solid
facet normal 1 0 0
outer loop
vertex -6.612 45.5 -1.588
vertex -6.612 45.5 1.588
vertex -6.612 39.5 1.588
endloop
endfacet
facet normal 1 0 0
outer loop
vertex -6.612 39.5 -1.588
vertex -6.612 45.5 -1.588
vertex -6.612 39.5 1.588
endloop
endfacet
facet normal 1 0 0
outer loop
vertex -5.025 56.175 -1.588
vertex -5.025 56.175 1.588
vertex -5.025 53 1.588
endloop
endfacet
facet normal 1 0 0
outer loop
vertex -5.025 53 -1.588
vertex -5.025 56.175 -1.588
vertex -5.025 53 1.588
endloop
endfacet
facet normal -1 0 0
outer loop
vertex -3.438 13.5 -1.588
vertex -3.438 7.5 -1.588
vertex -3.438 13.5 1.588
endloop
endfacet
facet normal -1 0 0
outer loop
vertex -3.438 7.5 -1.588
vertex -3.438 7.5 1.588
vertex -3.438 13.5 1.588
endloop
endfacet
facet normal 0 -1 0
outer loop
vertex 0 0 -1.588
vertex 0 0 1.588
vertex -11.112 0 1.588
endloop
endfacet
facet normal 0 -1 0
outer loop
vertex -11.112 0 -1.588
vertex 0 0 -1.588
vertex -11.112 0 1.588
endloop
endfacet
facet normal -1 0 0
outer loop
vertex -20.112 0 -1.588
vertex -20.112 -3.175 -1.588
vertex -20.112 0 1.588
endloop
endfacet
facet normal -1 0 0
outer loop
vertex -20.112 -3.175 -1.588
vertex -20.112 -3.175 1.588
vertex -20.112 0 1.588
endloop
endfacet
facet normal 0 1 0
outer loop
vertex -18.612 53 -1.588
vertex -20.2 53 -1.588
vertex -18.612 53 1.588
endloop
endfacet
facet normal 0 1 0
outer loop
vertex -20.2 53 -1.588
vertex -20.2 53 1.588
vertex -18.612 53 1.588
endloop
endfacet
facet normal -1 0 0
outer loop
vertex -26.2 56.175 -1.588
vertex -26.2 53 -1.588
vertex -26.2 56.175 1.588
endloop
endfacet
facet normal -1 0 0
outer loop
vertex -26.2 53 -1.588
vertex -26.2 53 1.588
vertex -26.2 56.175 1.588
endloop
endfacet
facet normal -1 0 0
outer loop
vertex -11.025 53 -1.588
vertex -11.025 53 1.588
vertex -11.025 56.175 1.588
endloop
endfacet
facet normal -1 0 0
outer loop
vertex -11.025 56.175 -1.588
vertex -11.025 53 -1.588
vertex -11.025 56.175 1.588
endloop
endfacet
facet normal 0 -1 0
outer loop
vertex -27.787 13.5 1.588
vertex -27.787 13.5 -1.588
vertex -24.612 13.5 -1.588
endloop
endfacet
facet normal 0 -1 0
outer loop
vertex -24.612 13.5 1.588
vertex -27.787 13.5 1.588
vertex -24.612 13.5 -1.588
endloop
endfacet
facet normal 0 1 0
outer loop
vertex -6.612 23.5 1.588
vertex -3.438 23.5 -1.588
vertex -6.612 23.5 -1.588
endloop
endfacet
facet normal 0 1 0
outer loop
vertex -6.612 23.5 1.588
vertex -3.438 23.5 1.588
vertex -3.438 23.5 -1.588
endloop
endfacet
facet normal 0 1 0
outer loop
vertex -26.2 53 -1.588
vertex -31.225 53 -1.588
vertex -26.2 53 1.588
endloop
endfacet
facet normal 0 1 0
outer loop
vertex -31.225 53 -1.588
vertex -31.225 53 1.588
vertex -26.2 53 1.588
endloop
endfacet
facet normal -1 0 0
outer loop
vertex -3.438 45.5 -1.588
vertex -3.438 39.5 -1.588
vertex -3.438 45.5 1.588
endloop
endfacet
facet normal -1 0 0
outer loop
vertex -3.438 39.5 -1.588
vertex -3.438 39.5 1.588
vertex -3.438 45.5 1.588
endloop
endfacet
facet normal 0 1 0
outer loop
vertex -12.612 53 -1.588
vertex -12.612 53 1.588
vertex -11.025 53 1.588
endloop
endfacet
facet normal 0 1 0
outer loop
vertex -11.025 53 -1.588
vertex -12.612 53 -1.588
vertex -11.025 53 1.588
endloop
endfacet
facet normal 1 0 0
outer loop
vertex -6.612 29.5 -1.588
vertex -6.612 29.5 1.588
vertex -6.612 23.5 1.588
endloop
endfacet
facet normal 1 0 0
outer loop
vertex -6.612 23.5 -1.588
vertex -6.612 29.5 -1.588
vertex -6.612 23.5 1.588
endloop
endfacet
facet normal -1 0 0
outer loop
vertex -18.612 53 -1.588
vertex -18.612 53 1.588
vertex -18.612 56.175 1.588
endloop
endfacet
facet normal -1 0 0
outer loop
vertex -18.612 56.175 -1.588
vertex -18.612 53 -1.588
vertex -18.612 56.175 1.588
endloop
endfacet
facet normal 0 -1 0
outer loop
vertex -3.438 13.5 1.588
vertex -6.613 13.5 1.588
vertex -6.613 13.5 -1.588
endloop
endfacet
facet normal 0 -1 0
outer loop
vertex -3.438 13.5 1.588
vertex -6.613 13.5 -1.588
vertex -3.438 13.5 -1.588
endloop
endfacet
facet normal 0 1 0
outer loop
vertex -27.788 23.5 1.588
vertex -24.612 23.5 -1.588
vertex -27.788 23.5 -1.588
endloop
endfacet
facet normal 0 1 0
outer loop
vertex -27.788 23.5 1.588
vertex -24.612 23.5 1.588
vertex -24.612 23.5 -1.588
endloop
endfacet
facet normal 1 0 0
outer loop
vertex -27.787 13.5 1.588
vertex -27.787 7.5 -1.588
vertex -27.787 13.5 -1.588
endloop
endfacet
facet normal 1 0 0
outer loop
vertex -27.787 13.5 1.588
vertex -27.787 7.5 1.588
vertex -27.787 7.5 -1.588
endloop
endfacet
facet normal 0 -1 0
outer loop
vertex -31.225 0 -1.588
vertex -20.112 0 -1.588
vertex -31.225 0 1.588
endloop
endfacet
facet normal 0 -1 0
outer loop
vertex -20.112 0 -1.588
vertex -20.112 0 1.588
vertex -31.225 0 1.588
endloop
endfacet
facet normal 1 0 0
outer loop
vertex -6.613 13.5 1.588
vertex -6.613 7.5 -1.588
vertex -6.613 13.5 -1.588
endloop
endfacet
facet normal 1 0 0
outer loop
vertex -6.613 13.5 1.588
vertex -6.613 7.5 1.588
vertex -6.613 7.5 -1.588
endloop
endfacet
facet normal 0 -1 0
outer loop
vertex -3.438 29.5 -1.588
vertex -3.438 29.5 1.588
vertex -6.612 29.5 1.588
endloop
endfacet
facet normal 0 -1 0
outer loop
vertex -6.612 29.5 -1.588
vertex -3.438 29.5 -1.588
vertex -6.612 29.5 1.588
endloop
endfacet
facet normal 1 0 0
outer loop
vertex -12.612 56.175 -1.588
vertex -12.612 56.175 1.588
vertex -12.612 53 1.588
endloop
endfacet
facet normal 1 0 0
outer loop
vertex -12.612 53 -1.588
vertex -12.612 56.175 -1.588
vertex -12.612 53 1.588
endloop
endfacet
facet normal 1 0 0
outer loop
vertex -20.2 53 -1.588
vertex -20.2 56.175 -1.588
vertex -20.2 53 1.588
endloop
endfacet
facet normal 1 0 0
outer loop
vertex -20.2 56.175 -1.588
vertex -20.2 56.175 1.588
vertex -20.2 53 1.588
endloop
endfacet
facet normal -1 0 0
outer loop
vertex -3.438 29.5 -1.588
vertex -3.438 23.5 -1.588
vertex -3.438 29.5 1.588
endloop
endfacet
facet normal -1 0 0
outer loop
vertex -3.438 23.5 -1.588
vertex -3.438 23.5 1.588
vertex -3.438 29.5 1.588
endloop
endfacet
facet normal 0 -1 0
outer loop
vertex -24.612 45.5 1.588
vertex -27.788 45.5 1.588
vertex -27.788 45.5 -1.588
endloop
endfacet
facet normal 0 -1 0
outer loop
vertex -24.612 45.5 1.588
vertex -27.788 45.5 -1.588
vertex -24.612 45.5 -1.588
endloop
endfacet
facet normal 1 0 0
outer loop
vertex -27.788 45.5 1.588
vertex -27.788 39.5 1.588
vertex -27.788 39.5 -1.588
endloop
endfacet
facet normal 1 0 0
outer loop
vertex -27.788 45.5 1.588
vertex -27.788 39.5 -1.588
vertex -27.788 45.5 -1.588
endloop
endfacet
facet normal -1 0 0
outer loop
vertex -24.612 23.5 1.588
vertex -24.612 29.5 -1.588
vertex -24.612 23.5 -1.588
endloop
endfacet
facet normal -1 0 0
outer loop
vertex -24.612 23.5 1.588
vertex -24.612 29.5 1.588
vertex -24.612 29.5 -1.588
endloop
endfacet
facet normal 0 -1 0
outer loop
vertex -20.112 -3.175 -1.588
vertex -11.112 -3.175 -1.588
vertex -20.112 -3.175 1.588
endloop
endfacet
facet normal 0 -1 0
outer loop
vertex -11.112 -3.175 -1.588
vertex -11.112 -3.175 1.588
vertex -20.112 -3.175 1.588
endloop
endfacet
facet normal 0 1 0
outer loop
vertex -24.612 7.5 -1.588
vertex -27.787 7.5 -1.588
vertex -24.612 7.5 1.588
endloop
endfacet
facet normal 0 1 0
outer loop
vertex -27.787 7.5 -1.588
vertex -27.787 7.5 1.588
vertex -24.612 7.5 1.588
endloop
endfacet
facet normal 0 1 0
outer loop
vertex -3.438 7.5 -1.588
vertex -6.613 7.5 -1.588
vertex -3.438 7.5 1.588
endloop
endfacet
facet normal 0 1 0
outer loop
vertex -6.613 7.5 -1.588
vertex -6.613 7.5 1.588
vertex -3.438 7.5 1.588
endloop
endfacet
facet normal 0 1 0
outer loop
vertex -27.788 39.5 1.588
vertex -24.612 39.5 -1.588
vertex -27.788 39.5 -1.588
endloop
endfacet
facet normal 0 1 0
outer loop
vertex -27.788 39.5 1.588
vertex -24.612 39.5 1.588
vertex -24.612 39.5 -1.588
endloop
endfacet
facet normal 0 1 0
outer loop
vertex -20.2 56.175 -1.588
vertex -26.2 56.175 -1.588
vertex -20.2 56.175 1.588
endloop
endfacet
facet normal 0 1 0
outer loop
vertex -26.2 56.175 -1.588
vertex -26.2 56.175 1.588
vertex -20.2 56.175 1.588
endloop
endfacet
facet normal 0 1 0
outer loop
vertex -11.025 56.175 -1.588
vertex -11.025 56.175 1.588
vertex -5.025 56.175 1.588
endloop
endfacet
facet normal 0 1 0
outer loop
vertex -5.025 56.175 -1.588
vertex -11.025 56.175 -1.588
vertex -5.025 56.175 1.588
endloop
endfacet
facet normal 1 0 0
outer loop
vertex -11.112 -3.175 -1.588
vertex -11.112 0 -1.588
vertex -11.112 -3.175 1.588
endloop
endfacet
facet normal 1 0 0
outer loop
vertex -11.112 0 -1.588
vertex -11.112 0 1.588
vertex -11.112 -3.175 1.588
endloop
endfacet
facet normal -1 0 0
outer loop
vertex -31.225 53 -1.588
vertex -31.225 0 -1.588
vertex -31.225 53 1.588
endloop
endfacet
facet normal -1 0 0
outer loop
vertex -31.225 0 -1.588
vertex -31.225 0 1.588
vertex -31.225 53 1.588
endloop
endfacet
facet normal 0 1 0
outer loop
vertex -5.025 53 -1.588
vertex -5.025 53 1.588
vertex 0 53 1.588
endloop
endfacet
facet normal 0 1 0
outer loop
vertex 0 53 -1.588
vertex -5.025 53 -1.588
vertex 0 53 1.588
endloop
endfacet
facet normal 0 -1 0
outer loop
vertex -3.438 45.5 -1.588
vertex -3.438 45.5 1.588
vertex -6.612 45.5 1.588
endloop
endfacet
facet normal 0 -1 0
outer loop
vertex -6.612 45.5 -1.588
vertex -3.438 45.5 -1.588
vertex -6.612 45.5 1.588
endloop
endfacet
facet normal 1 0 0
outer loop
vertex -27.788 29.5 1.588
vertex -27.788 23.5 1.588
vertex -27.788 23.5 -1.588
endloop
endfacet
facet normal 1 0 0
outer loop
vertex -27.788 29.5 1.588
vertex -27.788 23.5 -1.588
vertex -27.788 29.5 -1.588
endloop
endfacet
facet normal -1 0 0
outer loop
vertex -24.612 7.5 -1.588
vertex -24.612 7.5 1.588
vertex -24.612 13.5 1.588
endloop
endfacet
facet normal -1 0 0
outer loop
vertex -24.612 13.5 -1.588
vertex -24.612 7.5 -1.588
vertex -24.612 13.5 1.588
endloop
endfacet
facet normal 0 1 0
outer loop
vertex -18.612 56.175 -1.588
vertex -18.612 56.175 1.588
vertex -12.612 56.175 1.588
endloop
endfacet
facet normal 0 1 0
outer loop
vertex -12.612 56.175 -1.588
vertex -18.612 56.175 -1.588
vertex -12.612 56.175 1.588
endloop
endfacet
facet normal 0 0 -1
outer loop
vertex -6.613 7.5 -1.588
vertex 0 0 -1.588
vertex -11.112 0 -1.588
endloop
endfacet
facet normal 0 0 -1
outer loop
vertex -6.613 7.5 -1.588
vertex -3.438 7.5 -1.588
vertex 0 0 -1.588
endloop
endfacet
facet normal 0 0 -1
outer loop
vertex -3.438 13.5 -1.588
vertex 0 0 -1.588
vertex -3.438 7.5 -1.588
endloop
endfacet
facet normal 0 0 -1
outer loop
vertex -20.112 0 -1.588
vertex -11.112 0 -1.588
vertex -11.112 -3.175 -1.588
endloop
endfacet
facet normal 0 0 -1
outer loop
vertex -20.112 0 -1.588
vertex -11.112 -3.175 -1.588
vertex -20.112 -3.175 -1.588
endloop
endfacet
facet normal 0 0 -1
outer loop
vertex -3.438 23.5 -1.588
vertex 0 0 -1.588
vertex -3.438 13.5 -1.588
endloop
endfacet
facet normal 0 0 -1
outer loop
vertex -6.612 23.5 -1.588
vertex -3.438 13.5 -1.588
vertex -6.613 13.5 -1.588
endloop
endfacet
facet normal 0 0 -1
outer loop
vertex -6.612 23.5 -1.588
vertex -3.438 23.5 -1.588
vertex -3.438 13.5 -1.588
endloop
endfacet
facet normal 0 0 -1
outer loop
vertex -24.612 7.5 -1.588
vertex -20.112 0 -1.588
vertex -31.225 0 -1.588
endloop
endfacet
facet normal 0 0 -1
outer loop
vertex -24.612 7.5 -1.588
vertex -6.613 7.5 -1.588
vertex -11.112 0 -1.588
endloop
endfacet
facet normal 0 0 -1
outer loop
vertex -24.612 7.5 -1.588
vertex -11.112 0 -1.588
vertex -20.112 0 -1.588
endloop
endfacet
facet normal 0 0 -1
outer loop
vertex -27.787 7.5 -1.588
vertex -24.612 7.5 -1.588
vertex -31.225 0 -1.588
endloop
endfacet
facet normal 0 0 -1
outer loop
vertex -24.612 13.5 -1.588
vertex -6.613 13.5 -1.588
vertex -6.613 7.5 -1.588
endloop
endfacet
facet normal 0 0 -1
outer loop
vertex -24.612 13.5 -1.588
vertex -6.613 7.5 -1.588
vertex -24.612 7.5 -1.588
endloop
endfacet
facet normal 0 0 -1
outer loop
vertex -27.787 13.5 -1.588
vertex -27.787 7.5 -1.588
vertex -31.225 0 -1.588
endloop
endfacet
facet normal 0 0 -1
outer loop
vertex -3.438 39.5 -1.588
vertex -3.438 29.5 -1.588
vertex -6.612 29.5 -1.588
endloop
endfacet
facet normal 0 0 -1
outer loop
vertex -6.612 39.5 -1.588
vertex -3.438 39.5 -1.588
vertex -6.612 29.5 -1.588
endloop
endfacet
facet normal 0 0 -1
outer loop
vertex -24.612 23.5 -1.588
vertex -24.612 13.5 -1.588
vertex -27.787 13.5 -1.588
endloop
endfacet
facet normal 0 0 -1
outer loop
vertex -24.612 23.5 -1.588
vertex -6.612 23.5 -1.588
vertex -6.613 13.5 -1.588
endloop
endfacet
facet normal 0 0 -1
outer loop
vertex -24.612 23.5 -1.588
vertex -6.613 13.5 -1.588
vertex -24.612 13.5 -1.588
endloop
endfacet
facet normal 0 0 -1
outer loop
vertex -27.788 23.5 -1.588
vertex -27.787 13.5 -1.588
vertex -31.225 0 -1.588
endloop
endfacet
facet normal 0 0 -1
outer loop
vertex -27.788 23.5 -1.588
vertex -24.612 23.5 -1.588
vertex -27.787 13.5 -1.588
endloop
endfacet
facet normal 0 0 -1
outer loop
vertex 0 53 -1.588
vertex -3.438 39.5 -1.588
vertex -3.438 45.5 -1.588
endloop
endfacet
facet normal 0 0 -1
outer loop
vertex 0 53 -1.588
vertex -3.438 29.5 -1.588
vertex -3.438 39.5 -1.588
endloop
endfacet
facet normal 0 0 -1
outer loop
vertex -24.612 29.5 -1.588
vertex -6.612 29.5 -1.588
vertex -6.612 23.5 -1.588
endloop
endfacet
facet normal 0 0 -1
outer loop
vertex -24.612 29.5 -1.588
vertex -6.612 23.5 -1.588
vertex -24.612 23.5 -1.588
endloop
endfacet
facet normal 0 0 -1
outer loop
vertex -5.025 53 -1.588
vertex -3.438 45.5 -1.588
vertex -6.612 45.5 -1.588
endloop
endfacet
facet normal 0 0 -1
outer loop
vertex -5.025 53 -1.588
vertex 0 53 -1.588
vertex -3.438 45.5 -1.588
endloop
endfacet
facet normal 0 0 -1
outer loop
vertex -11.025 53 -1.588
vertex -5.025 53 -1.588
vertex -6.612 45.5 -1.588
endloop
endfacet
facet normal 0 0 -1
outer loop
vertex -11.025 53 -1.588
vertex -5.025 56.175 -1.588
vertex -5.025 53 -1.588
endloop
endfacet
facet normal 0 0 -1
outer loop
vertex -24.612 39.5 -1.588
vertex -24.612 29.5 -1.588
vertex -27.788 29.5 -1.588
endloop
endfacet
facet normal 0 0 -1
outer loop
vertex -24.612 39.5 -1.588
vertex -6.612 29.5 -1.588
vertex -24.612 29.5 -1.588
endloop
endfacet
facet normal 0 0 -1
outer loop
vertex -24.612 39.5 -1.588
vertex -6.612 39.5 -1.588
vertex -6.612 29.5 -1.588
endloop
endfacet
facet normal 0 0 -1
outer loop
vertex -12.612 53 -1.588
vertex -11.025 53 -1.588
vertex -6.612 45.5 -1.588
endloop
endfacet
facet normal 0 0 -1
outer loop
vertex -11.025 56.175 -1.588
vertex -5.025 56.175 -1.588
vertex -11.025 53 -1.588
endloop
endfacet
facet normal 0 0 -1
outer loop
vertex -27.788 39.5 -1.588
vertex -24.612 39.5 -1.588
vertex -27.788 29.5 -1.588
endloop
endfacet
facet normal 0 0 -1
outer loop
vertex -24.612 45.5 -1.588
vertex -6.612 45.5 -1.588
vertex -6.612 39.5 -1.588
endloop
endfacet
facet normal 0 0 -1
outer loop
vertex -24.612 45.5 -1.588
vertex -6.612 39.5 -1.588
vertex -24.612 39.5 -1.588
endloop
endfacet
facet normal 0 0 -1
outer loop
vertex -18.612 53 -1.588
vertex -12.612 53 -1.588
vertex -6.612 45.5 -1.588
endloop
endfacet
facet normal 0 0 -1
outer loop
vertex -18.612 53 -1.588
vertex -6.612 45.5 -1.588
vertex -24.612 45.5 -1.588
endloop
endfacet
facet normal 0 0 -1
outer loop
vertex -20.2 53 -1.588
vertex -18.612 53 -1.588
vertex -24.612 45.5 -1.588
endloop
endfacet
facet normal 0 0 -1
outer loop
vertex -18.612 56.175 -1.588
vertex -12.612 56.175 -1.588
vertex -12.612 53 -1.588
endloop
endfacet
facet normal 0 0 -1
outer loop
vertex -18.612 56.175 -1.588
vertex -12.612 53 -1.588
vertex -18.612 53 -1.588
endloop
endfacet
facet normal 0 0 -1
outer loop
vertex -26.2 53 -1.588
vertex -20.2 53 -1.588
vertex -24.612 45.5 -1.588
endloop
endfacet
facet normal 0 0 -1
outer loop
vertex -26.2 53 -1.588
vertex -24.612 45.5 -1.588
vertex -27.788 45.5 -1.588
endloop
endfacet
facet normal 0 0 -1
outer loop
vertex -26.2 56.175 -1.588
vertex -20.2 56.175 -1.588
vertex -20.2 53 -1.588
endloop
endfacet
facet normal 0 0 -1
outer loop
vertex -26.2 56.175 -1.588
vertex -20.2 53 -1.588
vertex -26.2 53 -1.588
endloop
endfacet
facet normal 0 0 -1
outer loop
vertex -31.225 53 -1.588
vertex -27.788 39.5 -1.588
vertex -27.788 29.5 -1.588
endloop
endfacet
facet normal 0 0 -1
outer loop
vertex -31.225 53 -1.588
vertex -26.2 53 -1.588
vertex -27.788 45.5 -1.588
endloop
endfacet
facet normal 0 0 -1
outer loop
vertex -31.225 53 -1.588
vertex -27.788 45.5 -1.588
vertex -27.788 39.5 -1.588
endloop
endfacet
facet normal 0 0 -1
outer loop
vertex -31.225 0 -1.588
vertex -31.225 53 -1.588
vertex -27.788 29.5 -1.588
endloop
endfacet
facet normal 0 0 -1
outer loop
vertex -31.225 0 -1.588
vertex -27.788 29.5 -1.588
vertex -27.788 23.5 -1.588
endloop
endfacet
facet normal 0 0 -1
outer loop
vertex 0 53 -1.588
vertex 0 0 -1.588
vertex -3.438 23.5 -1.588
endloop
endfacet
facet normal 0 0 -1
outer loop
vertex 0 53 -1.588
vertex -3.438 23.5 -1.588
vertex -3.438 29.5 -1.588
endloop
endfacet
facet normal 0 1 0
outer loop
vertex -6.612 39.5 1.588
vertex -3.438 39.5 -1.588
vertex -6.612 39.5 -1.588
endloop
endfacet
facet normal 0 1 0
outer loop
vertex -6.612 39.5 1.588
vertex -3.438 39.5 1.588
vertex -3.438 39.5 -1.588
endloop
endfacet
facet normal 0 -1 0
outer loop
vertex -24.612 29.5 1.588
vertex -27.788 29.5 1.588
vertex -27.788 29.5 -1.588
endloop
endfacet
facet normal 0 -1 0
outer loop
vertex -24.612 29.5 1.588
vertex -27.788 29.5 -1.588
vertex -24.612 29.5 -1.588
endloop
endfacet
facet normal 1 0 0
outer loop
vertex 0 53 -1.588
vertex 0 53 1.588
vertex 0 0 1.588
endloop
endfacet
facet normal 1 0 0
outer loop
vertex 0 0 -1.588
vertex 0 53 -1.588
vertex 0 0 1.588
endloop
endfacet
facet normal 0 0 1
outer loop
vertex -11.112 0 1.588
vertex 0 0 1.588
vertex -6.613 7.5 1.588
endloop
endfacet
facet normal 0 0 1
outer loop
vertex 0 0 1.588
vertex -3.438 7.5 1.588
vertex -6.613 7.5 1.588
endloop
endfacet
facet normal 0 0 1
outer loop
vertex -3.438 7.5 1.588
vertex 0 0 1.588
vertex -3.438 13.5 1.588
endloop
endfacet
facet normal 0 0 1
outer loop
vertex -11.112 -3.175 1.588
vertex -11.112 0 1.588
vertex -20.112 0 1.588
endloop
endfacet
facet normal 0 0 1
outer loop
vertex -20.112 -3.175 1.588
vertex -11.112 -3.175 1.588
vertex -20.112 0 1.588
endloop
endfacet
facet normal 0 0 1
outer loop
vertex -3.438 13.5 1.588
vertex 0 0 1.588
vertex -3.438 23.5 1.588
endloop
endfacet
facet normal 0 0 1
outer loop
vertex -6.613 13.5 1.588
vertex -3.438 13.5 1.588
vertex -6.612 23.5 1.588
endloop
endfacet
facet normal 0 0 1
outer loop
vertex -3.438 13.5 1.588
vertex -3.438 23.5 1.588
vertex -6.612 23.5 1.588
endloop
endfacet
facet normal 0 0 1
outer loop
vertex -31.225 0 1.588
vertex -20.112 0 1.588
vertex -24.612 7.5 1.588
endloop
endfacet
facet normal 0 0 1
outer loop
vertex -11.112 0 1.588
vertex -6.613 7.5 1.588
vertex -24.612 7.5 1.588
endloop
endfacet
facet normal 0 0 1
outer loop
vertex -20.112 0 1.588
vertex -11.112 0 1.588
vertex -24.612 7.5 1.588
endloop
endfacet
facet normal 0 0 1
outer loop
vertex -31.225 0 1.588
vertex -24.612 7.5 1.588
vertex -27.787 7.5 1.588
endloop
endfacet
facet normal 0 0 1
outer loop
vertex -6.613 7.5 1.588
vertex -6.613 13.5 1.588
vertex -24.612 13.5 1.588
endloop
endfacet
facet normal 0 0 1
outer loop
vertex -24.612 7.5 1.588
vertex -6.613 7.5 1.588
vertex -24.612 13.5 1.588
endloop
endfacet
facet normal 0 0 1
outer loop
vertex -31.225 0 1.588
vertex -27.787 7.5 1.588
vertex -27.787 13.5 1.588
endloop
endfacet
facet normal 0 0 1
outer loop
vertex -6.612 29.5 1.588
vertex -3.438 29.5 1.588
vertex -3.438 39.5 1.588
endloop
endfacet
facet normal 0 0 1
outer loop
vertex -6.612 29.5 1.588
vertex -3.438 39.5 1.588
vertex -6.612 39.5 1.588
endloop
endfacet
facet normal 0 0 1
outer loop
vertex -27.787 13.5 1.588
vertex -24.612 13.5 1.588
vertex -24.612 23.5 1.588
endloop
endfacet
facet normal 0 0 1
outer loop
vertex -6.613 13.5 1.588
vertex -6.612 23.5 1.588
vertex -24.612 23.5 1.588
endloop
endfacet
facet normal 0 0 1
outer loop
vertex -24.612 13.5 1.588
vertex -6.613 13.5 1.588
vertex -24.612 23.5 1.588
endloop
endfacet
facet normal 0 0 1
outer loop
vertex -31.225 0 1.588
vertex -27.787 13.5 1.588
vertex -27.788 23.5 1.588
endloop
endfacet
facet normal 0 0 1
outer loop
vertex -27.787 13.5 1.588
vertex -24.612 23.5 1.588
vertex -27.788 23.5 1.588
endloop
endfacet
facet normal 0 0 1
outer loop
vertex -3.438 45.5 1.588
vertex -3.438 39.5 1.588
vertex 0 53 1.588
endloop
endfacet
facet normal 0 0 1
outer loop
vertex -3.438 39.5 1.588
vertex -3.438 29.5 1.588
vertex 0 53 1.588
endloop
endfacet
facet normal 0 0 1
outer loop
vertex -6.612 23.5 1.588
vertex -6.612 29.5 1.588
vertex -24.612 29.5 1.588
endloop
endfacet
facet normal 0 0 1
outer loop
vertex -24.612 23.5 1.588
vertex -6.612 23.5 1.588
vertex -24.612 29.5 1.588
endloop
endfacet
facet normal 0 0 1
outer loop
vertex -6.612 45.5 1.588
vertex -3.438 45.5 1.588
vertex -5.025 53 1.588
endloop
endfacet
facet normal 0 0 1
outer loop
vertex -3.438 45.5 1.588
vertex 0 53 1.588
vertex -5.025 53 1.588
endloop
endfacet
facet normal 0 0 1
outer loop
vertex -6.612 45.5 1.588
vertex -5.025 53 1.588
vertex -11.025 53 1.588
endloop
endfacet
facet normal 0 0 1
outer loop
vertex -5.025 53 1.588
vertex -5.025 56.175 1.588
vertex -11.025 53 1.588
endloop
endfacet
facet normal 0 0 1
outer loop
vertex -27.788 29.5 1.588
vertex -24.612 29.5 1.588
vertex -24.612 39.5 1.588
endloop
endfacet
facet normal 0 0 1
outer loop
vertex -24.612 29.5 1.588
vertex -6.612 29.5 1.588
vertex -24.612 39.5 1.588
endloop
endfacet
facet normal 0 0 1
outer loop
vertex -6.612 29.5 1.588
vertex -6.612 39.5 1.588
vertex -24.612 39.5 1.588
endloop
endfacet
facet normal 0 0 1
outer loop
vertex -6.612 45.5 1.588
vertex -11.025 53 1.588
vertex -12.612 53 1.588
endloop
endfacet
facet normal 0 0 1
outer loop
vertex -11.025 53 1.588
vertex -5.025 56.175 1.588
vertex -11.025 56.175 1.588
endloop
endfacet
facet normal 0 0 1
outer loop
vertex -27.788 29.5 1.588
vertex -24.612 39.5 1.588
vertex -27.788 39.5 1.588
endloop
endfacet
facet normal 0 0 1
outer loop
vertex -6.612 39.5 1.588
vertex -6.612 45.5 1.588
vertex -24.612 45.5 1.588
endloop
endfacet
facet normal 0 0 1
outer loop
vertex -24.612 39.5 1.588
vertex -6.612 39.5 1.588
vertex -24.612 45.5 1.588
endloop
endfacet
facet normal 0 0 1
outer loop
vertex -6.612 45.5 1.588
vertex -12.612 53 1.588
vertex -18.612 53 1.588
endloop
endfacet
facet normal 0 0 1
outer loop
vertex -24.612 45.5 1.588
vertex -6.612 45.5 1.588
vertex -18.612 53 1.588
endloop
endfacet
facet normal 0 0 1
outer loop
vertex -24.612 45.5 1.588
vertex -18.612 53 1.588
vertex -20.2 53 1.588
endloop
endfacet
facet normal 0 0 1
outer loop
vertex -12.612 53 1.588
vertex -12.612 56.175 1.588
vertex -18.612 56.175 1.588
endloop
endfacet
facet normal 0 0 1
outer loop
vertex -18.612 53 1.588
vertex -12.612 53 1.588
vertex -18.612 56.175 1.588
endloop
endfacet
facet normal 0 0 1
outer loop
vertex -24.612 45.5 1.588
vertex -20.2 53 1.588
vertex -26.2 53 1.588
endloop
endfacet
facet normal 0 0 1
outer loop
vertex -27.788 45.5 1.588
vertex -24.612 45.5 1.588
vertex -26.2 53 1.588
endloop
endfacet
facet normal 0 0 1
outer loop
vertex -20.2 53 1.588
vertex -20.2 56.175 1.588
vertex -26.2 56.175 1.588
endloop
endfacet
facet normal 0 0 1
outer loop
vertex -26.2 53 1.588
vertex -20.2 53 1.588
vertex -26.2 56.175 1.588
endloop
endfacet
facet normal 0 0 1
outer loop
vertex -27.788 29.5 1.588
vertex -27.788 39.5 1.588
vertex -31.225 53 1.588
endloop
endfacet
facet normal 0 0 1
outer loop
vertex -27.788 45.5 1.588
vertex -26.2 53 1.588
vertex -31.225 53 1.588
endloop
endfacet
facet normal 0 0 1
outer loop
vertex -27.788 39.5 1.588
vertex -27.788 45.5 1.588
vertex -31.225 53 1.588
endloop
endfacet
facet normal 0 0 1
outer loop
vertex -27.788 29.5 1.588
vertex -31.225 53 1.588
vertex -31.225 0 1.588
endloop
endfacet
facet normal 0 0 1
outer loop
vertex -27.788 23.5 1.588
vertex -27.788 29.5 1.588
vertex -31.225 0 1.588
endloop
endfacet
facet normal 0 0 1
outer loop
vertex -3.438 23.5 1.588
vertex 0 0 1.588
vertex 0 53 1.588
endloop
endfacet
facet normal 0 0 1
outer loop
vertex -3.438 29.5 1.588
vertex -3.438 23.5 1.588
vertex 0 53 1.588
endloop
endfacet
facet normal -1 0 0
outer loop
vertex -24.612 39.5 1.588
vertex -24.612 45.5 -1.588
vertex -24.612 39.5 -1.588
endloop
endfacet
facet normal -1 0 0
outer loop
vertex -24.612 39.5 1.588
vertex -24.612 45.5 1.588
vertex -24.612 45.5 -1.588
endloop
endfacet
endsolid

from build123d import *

# Parameters (mm, degrees)
SKETCH1_W           = 3.175
SKETCH1_H           = 6
BOSS_EXTRUDE1_DEPTH = 1.5875


with BuildPart() as part:
    # Sketch1 → Boss-Extrude1 (new body, symmetric)
    with BuildSketch(Plane.XY):
        Polygon((0, 0), (-11.1125, 0), (-11.1125, -3.175), (-20.1125, -3.175), (-20.1125, 0), (-31.225, 0), (-31.225, 53), (-26.2, 53), (-26.2, 56.175), (-20.2, 56.175), (-20.2, 53), (-18.6125, 53), (-18.6125, 56.175), (-12.6125, 56.175), (-12.6125, 53), (-11.025, 53), (-11.025, 56.175), (-5.025, 56.175), (-5.025, 53), (0, 53), align=None)
        with Locations((-5.025, 10.5)):
            Rectangle(SKETCH1_W, SKETCH1_H, mode=Mode.SUBTRACT)
        Polygon((-5.025, 23.5), (-3.4375, 23.5), (-3.4375, 29.5), (-6.6125, 29.5), (-6.6125, 23.5), align=None, mode=Mode.SUBTRACT)
        Polygon((-5.025, 39.5), (-3.4375, 39.5), (-3.4375, 45.5), (-6.6125, 45.5), (-6.6125, 39.5), align=None, mode=Mode.SUBTRACT)
        Polygon((-24.6125, 39.5), (-26.2, 39.5), (-27.7875, 39.5), (-27.7875, 45.5), (-24.6125, 45.5), align=None, mode=Mode.SUBTRACT)
        Polygon((-24.6125, 23.5), (-26.2, 23.5), (-27.7875, 23.5), (-27.7875, 29.5), (-24.6125, 29.5), align=None, mode=Mode.SUBTRACT)
        with Locations((-26.2, 10.5)):
            Rectangle(SKETCH1_W, SKETCH1_H, mode=Mode.SUBTRACT)
    extrude(amount=BOSS_EXTRUDE1_DEPTH, both=True)


solid = part.part
